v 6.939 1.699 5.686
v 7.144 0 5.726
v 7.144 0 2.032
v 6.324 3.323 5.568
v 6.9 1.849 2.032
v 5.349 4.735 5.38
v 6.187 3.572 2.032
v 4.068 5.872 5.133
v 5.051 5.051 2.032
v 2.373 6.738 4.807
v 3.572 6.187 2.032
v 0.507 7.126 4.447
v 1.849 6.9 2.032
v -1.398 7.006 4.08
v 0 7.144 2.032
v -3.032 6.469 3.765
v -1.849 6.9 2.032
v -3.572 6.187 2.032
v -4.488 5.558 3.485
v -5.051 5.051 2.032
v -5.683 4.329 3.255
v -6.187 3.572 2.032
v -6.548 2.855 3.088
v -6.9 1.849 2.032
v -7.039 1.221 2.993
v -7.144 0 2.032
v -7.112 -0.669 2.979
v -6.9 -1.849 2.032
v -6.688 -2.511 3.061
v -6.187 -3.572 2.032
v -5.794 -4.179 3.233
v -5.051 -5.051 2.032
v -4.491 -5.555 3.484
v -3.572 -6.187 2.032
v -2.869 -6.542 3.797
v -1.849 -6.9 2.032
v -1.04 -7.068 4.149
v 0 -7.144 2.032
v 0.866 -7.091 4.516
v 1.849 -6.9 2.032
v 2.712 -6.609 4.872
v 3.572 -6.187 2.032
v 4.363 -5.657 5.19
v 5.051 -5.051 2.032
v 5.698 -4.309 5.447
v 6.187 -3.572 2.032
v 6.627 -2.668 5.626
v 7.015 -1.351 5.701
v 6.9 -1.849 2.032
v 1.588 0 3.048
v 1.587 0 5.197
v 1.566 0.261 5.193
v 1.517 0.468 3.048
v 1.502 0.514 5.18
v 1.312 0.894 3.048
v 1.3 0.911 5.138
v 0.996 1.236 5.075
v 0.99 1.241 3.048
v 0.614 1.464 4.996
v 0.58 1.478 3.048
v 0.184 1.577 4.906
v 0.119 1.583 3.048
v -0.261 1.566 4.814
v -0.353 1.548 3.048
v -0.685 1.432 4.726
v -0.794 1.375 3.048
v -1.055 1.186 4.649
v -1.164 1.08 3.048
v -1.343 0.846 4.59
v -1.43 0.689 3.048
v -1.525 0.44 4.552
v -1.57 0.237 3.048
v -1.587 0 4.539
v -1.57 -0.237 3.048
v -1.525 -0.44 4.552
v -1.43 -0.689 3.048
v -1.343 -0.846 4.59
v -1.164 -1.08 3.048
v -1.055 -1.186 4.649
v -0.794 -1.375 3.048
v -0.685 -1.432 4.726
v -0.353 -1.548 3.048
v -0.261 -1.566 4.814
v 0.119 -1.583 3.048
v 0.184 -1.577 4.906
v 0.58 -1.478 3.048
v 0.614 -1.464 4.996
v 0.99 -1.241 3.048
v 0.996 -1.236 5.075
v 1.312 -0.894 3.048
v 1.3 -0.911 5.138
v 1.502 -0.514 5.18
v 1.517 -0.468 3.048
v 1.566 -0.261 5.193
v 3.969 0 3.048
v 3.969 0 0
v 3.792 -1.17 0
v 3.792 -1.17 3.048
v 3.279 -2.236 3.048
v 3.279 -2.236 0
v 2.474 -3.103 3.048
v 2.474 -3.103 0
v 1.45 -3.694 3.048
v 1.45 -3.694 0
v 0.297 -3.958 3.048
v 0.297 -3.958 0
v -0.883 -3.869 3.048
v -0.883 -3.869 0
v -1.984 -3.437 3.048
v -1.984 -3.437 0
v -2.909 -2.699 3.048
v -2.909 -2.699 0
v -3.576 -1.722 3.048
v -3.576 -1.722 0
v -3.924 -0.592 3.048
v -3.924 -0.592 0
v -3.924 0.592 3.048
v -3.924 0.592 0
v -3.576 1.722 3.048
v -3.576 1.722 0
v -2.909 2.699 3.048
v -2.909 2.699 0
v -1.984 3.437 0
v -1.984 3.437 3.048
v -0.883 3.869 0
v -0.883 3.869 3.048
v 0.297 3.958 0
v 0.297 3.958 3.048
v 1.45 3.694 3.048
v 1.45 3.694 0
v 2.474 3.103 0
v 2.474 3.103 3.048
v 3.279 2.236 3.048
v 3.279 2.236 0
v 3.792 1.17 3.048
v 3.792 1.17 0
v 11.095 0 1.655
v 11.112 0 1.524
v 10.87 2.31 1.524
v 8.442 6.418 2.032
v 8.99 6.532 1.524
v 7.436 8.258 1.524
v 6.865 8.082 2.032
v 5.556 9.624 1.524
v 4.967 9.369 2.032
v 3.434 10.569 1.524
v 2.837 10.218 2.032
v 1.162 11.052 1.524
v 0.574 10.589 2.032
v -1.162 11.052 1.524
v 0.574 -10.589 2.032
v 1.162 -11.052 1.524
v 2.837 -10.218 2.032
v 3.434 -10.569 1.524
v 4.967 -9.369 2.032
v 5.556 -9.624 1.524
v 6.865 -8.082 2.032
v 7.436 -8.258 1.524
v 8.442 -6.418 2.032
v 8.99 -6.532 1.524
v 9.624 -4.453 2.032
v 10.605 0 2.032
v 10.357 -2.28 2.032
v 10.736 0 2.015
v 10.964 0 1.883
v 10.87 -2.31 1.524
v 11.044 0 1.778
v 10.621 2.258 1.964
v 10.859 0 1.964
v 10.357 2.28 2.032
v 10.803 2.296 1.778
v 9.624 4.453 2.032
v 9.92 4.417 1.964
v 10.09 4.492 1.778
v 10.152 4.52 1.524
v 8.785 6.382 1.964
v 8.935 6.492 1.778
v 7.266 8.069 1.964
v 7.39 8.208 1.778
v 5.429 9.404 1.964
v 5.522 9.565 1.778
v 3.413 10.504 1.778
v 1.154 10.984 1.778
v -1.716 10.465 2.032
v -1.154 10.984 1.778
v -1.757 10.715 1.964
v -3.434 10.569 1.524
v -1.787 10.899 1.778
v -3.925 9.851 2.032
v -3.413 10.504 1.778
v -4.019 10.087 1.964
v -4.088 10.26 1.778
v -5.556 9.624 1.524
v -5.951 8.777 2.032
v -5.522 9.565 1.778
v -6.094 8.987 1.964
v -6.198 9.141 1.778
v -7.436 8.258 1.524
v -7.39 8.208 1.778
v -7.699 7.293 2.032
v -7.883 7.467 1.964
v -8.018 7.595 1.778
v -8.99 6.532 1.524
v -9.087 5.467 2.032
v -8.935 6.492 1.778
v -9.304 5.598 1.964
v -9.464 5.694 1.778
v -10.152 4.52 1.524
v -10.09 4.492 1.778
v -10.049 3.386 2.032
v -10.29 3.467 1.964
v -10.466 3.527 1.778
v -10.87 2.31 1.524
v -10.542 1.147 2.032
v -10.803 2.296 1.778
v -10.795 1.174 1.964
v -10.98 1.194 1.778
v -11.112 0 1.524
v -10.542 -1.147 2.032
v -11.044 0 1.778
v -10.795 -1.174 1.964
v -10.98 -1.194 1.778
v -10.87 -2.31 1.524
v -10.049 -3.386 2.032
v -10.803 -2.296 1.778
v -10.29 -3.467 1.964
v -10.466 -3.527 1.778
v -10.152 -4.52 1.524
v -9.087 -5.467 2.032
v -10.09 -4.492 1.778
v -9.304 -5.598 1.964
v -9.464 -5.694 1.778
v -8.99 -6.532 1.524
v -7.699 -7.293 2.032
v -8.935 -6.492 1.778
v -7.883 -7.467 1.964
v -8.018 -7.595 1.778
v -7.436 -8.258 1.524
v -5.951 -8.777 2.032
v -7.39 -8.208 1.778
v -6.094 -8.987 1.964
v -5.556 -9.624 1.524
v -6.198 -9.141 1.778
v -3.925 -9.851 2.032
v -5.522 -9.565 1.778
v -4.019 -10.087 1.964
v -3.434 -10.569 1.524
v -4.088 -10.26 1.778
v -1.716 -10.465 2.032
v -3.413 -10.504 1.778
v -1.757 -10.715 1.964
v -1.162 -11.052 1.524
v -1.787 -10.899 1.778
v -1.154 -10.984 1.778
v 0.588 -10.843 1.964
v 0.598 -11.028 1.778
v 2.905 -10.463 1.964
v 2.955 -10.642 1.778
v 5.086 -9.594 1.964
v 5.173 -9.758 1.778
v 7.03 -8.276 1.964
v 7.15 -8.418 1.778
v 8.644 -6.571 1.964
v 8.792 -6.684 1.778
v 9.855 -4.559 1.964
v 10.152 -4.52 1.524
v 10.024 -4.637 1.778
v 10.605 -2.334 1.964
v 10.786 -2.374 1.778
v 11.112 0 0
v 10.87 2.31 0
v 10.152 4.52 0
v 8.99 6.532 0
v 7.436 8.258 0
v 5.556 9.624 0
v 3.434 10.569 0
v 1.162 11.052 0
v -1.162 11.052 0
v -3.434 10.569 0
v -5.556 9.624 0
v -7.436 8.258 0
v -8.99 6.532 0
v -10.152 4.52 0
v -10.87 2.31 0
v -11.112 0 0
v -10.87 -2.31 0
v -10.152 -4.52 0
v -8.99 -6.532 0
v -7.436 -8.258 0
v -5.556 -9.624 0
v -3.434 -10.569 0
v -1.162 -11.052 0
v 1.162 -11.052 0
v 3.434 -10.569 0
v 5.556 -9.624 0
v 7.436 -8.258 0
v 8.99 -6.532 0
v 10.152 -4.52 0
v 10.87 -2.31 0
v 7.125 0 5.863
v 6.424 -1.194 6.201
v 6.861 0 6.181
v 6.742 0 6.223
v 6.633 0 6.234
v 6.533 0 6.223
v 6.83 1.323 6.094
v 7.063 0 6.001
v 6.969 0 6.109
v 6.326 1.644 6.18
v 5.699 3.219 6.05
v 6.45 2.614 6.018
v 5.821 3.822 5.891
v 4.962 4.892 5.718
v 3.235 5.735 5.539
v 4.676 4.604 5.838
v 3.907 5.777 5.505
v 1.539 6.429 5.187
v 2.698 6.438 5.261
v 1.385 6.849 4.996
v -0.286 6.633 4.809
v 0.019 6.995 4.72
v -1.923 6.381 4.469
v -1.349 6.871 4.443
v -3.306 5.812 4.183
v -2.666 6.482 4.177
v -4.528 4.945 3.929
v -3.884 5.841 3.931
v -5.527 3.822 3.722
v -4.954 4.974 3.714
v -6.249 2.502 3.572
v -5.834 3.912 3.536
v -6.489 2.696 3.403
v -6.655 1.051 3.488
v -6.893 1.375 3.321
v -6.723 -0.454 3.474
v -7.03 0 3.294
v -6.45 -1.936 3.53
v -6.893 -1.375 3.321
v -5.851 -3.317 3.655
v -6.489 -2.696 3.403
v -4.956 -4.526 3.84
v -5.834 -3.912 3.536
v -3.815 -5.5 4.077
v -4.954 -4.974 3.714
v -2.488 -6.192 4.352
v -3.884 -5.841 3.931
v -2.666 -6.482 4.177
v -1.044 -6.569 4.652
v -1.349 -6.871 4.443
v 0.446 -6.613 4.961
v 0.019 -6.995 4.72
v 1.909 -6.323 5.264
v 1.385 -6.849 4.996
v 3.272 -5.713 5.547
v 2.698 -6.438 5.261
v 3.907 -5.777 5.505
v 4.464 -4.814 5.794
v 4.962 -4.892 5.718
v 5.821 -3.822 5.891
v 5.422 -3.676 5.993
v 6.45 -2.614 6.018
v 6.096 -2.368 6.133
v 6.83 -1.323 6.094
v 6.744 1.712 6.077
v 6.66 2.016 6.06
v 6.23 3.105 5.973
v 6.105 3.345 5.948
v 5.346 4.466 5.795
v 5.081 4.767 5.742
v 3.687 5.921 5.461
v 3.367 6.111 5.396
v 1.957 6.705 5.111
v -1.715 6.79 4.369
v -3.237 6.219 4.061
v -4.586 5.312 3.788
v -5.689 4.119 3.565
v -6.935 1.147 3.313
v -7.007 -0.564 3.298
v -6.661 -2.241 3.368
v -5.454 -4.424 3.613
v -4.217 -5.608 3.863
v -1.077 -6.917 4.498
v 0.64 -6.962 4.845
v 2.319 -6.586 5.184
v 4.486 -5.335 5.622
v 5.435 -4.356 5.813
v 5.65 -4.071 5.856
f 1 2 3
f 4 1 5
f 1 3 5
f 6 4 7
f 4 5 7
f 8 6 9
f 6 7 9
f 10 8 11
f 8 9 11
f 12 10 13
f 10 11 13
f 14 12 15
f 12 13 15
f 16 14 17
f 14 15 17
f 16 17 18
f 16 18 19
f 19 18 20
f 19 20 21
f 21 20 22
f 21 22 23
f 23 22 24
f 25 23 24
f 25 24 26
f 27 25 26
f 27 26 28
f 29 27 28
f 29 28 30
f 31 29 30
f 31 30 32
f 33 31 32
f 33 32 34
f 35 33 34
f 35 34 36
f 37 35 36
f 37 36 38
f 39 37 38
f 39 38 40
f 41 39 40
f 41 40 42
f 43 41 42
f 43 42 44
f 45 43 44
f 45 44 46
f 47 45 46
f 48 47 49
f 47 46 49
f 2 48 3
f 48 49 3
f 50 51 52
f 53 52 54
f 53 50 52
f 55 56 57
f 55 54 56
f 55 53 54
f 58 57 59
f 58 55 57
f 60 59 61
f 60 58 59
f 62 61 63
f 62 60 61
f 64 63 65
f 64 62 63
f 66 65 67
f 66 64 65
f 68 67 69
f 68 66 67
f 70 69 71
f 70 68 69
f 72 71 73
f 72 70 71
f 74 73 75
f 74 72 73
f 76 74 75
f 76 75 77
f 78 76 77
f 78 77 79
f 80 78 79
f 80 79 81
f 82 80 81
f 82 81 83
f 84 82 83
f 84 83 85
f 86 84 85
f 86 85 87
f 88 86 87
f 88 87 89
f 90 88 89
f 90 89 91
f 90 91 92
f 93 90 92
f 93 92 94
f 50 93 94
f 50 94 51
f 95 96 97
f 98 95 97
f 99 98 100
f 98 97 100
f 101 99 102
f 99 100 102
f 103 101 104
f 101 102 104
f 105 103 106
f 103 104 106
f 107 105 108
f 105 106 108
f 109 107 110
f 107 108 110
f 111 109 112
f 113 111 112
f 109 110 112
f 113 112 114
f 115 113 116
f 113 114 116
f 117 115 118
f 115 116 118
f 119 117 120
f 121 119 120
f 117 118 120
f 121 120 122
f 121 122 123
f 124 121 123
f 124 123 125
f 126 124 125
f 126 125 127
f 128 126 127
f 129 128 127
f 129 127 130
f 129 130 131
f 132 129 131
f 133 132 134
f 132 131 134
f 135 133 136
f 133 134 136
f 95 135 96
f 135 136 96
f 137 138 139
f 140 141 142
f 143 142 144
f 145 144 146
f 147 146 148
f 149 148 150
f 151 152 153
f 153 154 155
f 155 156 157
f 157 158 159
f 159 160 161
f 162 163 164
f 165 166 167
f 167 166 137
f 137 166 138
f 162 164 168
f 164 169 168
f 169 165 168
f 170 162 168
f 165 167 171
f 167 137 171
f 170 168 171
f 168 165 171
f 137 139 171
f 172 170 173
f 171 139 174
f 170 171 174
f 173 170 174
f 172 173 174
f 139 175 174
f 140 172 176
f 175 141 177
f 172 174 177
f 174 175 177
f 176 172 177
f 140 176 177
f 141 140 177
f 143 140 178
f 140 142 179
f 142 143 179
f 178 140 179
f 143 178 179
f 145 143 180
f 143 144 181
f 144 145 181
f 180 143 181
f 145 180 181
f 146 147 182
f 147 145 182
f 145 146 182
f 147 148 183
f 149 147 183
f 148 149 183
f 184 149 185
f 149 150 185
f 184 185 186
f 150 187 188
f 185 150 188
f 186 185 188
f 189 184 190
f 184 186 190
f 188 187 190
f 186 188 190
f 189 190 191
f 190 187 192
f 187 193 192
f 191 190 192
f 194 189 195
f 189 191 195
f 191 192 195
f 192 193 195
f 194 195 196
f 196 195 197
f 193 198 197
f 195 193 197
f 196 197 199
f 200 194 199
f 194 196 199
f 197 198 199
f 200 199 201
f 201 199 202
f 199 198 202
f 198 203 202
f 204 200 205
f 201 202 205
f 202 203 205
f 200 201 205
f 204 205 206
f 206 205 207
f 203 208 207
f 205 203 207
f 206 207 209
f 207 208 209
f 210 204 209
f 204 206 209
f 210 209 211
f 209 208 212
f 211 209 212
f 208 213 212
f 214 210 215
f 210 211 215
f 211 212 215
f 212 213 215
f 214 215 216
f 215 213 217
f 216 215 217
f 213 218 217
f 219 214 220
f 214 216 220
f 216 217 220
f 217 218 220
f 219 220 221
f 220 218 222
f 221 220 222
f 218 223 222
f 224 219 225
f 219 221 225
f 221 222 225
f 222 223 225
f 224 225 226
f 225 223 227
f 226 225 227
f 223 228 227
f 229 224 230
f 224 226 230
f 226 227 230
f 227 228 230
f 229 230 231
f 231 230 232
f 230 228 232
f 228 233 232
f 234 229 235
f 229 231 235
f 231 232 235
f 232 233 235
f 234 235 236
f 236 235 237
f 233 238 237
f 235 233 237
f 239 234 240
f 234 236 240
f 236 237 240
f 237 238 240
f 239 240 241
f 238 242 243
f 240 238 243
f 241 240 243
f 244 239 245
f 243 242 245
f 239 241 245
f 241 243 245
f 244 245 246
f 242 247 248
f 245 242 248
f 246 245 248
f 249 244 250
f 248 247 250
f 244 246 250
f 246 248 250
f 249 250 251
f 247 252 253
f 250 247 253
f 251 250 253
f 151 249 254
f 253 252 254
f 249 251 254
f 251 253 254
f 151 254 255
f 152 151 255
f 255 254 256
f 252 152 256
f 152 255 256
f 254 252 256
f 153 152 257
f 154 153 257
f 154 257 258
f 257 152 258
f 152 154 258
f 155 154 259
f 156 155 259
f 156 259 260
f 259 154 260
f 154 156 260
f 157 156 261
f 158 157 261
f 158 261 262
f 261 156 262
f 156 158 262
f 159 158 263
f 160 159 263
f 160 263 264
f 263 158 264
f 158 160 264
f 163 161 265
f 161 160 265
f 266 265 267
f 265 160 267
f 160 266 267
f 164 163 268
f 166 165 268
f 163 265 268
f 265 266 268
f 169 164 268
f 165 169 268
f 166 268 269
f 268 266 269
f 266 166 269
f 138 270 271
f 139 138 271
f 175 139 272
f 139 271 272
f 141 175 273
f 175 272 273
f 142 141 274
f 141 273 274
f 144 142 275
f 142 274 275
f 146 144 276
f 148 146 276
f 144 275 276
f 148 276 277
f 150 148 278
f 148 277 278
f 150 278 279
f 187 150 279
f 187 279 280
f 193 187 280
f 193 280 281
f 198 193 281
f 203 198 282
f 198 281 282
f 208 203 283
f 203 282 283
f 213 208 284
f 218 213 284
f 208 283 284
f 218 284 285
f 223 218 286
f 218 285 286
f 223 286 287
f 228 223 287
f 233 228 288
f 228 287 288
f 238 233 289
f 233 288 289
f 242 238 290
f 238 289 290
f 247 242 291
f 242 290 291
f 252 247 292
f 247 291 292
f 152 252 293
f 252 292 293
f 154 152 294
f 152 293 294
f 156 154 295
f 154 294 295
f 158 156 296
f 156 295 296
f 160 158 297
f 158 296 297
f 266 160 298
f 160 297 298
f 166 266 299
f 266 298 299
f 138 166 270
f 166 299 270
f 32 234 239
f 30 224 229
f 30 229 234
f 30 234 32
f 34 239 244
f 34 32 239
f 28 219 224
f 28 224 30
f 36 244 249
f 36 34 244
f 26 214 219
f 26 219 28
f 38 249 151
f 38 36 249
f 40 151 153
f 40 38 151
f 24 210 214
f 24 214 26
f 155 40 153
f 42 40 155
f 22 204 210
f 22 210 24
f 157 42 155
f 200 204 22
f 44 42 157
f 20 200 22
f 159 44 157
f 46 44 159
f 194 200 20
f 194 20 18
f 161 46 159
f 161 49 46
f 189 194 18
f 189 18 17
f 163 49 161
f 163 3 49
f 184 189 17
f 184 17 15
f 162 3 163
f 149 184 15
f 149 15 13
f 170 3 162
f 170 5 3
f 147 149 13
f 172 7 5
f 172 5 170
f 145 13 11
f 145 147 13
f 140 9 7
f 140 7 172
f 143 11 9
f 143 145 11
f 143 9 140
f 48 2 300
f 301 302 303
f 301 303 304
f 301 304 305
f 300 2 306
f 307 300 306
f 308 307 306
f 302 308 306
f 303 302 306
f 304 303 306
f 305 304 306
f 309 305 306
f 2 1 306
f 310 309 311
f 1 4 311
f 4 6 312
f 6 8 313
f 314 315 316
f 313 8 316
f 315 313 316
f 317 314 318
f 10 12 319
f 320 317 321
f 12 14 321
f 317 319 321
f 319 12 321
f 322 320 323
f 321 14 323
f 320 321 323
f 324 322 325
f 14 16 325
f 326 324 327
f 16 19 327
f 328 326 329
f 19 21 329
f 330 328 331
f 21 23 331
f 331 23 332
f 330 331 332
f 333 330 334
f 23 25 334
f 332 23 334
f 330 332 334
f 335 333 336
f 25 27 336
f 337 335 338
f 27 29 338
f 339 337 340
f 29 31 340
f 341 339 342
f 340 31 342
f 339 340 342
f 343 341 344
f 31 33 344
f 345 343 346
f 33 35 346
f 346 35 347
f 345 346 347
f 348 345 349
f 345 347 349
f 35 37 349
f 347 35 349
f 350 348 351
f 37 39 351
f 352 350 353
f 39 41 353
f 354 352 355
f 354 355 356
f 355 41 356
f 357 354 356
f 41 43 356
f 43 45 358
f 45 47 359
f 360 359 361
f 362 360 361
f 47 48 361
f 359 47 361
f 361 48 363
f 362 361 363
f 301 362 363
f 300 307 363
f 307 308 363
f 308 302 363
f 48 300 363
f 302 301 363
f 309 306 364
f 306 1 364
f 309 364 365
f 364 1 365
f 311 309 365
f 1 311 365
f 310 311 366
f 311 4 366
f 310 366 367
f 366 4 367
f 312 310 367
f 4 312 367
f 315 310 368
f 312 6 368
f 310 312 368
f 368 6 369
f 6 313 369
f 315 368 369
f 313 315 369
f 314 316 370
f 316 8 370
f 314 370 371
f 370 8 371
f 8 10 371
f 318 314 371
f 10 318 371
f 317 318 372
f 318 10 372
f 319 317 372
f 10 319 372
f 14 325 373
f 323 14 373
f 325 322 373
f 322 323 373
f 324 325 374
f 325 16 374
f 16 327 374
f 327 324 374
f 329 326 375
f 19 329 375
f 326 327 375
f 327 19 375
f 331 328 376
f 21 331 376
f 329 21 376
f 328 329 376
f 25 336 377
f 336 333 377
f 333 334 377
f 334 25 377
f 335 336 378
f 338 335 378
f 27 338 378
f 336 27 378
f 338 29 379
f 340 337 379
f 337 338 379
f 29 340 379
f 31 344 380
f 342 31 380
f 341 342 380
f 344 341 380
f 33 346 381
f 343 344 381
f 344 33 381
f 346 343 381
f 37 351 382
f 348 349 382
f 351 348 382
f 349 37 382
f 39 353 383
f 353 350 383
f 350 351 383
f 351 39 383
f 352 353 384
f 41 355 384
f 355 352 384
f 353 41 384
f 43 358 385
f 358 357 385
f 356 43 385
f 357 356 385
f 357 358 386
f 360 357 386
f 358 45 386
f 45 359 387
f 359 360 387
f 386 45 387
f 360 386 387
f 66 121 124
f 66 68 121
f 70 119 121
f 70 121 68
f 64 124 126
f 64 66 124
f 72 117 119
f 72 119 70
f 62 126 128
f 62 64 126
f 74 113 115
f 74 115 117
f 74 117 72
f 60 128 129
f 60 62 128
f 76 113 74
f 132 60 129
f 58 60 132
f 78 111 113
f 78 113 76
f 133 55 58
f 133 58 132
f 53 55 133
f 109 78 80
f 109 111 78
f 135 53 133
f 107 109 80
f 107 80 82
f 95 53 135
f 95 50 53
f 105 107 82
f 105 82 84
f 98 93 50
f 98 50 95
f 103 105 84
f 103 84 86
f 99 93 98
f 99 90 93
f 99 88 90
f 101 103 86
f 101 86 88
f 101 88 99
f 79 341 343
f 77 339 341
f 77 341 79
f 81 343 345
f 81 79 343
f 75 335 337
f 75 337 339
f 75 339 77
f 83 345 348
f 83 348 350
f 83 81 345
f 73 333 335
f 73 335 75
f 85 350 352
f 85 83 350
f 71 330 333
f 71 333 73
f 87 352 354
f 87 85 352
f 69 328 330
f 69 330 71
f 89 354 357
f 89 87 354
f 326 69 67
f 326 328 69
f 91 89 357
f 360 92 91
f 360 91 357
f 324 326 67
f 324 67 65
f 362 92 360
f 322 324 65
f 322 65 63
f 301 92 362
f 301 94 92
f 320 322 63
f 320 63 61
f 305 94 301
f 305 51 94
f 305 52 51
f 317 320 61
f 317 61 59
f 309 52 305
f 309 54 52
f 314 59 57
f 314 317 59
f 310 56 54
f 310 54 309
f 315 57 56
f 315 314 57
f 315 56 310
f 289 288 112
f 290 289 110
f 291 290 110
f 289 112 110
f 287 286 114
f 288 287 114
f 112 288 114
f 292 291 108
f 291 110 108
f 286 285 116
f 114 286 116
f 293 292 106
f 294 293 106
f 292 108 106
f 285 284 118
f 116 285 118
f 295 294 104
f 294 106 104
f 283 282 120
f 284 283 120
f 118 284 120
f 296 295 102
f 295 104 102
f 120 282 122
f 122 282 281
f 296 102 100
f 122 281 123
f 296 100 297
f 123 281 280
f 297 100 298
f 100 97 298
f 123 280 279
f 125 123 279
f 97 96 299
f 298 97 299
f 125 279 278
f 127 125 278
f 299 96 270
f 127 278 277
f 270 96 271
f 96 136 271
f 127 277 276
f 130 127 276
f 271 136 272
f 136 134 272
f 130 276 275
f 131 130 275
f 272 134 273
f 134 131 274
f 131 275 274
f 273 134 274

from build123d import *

# Parameters (mm, degrees)
F0_R          = 11.1125
F0_R_2        = 7.14375
F1_DEPTH      = 2.032
F0_R_3        = 1.5875
F2_DEPTH      = 6.35
F4_DEPTH      = 11.1135
F4_DEPTH_BACK = 11.1135
F5_R          = 3.96875
F5_R_2        = 1.5875
F6_DEPTH      = 3.048
F7_R          = 0.508


with BuildPart() as f1:
    # F0 (on Top) → F1 (new body)
    with BuildSketch(Plane.XY):
        Circle(F0_R)
        Circle(F0_R_2, mode=Mode.SUBTRACT)
    extrude(amount=F1_DEPTH)

    # F0 (on Top) → F2 (join)
    with BuildSketch(Plane.XY):
        Circle(F0_R_2)
        Circle(F0_R_3, mode=Mode.SUBTRACT)
    extrude(amount=F2_DEPTH)

    # F3 (on Front) → F4 (cut, two sides)
    with BuildSketch(Plane.XZ) as f4_sk:
        Polygon((7.14375, 6.35), (-7.14375, 6.35), (-7.14375, 3.3864264842), align=None)
    extrude(amount=-F4_DEPTH, mode=Mode.SUBTRACT)
    extrude(f4_sk.sketch, amount=F4_DEPTH_BACK, mode=Mode.SUBTRACT)

    # F5 (on face) → F6 (cut)
    with BuildSketch(Plane(origin=(0, 0, 0), x_dir=(1, 0, 0), z_dir=(0, 0, -1))):
        Circle(F5_R)
        Circle(F5_R_2, mode=Mode.SUBTRACT)
    extrude(amount=-F6_DEPTH, mode=Mode.SUBTRACT)

    # F7
    f7_edges = [f1.edges().sort_by_distance(p)[0] for p in [
        (0, -7.14375, 4.868213),
        (0, 7.14375, 4.868213),
        (-11.1125, 0, 2.032),
    ]]
    fillet(f7_edges, radius=F7_R)


solid = f1.part
